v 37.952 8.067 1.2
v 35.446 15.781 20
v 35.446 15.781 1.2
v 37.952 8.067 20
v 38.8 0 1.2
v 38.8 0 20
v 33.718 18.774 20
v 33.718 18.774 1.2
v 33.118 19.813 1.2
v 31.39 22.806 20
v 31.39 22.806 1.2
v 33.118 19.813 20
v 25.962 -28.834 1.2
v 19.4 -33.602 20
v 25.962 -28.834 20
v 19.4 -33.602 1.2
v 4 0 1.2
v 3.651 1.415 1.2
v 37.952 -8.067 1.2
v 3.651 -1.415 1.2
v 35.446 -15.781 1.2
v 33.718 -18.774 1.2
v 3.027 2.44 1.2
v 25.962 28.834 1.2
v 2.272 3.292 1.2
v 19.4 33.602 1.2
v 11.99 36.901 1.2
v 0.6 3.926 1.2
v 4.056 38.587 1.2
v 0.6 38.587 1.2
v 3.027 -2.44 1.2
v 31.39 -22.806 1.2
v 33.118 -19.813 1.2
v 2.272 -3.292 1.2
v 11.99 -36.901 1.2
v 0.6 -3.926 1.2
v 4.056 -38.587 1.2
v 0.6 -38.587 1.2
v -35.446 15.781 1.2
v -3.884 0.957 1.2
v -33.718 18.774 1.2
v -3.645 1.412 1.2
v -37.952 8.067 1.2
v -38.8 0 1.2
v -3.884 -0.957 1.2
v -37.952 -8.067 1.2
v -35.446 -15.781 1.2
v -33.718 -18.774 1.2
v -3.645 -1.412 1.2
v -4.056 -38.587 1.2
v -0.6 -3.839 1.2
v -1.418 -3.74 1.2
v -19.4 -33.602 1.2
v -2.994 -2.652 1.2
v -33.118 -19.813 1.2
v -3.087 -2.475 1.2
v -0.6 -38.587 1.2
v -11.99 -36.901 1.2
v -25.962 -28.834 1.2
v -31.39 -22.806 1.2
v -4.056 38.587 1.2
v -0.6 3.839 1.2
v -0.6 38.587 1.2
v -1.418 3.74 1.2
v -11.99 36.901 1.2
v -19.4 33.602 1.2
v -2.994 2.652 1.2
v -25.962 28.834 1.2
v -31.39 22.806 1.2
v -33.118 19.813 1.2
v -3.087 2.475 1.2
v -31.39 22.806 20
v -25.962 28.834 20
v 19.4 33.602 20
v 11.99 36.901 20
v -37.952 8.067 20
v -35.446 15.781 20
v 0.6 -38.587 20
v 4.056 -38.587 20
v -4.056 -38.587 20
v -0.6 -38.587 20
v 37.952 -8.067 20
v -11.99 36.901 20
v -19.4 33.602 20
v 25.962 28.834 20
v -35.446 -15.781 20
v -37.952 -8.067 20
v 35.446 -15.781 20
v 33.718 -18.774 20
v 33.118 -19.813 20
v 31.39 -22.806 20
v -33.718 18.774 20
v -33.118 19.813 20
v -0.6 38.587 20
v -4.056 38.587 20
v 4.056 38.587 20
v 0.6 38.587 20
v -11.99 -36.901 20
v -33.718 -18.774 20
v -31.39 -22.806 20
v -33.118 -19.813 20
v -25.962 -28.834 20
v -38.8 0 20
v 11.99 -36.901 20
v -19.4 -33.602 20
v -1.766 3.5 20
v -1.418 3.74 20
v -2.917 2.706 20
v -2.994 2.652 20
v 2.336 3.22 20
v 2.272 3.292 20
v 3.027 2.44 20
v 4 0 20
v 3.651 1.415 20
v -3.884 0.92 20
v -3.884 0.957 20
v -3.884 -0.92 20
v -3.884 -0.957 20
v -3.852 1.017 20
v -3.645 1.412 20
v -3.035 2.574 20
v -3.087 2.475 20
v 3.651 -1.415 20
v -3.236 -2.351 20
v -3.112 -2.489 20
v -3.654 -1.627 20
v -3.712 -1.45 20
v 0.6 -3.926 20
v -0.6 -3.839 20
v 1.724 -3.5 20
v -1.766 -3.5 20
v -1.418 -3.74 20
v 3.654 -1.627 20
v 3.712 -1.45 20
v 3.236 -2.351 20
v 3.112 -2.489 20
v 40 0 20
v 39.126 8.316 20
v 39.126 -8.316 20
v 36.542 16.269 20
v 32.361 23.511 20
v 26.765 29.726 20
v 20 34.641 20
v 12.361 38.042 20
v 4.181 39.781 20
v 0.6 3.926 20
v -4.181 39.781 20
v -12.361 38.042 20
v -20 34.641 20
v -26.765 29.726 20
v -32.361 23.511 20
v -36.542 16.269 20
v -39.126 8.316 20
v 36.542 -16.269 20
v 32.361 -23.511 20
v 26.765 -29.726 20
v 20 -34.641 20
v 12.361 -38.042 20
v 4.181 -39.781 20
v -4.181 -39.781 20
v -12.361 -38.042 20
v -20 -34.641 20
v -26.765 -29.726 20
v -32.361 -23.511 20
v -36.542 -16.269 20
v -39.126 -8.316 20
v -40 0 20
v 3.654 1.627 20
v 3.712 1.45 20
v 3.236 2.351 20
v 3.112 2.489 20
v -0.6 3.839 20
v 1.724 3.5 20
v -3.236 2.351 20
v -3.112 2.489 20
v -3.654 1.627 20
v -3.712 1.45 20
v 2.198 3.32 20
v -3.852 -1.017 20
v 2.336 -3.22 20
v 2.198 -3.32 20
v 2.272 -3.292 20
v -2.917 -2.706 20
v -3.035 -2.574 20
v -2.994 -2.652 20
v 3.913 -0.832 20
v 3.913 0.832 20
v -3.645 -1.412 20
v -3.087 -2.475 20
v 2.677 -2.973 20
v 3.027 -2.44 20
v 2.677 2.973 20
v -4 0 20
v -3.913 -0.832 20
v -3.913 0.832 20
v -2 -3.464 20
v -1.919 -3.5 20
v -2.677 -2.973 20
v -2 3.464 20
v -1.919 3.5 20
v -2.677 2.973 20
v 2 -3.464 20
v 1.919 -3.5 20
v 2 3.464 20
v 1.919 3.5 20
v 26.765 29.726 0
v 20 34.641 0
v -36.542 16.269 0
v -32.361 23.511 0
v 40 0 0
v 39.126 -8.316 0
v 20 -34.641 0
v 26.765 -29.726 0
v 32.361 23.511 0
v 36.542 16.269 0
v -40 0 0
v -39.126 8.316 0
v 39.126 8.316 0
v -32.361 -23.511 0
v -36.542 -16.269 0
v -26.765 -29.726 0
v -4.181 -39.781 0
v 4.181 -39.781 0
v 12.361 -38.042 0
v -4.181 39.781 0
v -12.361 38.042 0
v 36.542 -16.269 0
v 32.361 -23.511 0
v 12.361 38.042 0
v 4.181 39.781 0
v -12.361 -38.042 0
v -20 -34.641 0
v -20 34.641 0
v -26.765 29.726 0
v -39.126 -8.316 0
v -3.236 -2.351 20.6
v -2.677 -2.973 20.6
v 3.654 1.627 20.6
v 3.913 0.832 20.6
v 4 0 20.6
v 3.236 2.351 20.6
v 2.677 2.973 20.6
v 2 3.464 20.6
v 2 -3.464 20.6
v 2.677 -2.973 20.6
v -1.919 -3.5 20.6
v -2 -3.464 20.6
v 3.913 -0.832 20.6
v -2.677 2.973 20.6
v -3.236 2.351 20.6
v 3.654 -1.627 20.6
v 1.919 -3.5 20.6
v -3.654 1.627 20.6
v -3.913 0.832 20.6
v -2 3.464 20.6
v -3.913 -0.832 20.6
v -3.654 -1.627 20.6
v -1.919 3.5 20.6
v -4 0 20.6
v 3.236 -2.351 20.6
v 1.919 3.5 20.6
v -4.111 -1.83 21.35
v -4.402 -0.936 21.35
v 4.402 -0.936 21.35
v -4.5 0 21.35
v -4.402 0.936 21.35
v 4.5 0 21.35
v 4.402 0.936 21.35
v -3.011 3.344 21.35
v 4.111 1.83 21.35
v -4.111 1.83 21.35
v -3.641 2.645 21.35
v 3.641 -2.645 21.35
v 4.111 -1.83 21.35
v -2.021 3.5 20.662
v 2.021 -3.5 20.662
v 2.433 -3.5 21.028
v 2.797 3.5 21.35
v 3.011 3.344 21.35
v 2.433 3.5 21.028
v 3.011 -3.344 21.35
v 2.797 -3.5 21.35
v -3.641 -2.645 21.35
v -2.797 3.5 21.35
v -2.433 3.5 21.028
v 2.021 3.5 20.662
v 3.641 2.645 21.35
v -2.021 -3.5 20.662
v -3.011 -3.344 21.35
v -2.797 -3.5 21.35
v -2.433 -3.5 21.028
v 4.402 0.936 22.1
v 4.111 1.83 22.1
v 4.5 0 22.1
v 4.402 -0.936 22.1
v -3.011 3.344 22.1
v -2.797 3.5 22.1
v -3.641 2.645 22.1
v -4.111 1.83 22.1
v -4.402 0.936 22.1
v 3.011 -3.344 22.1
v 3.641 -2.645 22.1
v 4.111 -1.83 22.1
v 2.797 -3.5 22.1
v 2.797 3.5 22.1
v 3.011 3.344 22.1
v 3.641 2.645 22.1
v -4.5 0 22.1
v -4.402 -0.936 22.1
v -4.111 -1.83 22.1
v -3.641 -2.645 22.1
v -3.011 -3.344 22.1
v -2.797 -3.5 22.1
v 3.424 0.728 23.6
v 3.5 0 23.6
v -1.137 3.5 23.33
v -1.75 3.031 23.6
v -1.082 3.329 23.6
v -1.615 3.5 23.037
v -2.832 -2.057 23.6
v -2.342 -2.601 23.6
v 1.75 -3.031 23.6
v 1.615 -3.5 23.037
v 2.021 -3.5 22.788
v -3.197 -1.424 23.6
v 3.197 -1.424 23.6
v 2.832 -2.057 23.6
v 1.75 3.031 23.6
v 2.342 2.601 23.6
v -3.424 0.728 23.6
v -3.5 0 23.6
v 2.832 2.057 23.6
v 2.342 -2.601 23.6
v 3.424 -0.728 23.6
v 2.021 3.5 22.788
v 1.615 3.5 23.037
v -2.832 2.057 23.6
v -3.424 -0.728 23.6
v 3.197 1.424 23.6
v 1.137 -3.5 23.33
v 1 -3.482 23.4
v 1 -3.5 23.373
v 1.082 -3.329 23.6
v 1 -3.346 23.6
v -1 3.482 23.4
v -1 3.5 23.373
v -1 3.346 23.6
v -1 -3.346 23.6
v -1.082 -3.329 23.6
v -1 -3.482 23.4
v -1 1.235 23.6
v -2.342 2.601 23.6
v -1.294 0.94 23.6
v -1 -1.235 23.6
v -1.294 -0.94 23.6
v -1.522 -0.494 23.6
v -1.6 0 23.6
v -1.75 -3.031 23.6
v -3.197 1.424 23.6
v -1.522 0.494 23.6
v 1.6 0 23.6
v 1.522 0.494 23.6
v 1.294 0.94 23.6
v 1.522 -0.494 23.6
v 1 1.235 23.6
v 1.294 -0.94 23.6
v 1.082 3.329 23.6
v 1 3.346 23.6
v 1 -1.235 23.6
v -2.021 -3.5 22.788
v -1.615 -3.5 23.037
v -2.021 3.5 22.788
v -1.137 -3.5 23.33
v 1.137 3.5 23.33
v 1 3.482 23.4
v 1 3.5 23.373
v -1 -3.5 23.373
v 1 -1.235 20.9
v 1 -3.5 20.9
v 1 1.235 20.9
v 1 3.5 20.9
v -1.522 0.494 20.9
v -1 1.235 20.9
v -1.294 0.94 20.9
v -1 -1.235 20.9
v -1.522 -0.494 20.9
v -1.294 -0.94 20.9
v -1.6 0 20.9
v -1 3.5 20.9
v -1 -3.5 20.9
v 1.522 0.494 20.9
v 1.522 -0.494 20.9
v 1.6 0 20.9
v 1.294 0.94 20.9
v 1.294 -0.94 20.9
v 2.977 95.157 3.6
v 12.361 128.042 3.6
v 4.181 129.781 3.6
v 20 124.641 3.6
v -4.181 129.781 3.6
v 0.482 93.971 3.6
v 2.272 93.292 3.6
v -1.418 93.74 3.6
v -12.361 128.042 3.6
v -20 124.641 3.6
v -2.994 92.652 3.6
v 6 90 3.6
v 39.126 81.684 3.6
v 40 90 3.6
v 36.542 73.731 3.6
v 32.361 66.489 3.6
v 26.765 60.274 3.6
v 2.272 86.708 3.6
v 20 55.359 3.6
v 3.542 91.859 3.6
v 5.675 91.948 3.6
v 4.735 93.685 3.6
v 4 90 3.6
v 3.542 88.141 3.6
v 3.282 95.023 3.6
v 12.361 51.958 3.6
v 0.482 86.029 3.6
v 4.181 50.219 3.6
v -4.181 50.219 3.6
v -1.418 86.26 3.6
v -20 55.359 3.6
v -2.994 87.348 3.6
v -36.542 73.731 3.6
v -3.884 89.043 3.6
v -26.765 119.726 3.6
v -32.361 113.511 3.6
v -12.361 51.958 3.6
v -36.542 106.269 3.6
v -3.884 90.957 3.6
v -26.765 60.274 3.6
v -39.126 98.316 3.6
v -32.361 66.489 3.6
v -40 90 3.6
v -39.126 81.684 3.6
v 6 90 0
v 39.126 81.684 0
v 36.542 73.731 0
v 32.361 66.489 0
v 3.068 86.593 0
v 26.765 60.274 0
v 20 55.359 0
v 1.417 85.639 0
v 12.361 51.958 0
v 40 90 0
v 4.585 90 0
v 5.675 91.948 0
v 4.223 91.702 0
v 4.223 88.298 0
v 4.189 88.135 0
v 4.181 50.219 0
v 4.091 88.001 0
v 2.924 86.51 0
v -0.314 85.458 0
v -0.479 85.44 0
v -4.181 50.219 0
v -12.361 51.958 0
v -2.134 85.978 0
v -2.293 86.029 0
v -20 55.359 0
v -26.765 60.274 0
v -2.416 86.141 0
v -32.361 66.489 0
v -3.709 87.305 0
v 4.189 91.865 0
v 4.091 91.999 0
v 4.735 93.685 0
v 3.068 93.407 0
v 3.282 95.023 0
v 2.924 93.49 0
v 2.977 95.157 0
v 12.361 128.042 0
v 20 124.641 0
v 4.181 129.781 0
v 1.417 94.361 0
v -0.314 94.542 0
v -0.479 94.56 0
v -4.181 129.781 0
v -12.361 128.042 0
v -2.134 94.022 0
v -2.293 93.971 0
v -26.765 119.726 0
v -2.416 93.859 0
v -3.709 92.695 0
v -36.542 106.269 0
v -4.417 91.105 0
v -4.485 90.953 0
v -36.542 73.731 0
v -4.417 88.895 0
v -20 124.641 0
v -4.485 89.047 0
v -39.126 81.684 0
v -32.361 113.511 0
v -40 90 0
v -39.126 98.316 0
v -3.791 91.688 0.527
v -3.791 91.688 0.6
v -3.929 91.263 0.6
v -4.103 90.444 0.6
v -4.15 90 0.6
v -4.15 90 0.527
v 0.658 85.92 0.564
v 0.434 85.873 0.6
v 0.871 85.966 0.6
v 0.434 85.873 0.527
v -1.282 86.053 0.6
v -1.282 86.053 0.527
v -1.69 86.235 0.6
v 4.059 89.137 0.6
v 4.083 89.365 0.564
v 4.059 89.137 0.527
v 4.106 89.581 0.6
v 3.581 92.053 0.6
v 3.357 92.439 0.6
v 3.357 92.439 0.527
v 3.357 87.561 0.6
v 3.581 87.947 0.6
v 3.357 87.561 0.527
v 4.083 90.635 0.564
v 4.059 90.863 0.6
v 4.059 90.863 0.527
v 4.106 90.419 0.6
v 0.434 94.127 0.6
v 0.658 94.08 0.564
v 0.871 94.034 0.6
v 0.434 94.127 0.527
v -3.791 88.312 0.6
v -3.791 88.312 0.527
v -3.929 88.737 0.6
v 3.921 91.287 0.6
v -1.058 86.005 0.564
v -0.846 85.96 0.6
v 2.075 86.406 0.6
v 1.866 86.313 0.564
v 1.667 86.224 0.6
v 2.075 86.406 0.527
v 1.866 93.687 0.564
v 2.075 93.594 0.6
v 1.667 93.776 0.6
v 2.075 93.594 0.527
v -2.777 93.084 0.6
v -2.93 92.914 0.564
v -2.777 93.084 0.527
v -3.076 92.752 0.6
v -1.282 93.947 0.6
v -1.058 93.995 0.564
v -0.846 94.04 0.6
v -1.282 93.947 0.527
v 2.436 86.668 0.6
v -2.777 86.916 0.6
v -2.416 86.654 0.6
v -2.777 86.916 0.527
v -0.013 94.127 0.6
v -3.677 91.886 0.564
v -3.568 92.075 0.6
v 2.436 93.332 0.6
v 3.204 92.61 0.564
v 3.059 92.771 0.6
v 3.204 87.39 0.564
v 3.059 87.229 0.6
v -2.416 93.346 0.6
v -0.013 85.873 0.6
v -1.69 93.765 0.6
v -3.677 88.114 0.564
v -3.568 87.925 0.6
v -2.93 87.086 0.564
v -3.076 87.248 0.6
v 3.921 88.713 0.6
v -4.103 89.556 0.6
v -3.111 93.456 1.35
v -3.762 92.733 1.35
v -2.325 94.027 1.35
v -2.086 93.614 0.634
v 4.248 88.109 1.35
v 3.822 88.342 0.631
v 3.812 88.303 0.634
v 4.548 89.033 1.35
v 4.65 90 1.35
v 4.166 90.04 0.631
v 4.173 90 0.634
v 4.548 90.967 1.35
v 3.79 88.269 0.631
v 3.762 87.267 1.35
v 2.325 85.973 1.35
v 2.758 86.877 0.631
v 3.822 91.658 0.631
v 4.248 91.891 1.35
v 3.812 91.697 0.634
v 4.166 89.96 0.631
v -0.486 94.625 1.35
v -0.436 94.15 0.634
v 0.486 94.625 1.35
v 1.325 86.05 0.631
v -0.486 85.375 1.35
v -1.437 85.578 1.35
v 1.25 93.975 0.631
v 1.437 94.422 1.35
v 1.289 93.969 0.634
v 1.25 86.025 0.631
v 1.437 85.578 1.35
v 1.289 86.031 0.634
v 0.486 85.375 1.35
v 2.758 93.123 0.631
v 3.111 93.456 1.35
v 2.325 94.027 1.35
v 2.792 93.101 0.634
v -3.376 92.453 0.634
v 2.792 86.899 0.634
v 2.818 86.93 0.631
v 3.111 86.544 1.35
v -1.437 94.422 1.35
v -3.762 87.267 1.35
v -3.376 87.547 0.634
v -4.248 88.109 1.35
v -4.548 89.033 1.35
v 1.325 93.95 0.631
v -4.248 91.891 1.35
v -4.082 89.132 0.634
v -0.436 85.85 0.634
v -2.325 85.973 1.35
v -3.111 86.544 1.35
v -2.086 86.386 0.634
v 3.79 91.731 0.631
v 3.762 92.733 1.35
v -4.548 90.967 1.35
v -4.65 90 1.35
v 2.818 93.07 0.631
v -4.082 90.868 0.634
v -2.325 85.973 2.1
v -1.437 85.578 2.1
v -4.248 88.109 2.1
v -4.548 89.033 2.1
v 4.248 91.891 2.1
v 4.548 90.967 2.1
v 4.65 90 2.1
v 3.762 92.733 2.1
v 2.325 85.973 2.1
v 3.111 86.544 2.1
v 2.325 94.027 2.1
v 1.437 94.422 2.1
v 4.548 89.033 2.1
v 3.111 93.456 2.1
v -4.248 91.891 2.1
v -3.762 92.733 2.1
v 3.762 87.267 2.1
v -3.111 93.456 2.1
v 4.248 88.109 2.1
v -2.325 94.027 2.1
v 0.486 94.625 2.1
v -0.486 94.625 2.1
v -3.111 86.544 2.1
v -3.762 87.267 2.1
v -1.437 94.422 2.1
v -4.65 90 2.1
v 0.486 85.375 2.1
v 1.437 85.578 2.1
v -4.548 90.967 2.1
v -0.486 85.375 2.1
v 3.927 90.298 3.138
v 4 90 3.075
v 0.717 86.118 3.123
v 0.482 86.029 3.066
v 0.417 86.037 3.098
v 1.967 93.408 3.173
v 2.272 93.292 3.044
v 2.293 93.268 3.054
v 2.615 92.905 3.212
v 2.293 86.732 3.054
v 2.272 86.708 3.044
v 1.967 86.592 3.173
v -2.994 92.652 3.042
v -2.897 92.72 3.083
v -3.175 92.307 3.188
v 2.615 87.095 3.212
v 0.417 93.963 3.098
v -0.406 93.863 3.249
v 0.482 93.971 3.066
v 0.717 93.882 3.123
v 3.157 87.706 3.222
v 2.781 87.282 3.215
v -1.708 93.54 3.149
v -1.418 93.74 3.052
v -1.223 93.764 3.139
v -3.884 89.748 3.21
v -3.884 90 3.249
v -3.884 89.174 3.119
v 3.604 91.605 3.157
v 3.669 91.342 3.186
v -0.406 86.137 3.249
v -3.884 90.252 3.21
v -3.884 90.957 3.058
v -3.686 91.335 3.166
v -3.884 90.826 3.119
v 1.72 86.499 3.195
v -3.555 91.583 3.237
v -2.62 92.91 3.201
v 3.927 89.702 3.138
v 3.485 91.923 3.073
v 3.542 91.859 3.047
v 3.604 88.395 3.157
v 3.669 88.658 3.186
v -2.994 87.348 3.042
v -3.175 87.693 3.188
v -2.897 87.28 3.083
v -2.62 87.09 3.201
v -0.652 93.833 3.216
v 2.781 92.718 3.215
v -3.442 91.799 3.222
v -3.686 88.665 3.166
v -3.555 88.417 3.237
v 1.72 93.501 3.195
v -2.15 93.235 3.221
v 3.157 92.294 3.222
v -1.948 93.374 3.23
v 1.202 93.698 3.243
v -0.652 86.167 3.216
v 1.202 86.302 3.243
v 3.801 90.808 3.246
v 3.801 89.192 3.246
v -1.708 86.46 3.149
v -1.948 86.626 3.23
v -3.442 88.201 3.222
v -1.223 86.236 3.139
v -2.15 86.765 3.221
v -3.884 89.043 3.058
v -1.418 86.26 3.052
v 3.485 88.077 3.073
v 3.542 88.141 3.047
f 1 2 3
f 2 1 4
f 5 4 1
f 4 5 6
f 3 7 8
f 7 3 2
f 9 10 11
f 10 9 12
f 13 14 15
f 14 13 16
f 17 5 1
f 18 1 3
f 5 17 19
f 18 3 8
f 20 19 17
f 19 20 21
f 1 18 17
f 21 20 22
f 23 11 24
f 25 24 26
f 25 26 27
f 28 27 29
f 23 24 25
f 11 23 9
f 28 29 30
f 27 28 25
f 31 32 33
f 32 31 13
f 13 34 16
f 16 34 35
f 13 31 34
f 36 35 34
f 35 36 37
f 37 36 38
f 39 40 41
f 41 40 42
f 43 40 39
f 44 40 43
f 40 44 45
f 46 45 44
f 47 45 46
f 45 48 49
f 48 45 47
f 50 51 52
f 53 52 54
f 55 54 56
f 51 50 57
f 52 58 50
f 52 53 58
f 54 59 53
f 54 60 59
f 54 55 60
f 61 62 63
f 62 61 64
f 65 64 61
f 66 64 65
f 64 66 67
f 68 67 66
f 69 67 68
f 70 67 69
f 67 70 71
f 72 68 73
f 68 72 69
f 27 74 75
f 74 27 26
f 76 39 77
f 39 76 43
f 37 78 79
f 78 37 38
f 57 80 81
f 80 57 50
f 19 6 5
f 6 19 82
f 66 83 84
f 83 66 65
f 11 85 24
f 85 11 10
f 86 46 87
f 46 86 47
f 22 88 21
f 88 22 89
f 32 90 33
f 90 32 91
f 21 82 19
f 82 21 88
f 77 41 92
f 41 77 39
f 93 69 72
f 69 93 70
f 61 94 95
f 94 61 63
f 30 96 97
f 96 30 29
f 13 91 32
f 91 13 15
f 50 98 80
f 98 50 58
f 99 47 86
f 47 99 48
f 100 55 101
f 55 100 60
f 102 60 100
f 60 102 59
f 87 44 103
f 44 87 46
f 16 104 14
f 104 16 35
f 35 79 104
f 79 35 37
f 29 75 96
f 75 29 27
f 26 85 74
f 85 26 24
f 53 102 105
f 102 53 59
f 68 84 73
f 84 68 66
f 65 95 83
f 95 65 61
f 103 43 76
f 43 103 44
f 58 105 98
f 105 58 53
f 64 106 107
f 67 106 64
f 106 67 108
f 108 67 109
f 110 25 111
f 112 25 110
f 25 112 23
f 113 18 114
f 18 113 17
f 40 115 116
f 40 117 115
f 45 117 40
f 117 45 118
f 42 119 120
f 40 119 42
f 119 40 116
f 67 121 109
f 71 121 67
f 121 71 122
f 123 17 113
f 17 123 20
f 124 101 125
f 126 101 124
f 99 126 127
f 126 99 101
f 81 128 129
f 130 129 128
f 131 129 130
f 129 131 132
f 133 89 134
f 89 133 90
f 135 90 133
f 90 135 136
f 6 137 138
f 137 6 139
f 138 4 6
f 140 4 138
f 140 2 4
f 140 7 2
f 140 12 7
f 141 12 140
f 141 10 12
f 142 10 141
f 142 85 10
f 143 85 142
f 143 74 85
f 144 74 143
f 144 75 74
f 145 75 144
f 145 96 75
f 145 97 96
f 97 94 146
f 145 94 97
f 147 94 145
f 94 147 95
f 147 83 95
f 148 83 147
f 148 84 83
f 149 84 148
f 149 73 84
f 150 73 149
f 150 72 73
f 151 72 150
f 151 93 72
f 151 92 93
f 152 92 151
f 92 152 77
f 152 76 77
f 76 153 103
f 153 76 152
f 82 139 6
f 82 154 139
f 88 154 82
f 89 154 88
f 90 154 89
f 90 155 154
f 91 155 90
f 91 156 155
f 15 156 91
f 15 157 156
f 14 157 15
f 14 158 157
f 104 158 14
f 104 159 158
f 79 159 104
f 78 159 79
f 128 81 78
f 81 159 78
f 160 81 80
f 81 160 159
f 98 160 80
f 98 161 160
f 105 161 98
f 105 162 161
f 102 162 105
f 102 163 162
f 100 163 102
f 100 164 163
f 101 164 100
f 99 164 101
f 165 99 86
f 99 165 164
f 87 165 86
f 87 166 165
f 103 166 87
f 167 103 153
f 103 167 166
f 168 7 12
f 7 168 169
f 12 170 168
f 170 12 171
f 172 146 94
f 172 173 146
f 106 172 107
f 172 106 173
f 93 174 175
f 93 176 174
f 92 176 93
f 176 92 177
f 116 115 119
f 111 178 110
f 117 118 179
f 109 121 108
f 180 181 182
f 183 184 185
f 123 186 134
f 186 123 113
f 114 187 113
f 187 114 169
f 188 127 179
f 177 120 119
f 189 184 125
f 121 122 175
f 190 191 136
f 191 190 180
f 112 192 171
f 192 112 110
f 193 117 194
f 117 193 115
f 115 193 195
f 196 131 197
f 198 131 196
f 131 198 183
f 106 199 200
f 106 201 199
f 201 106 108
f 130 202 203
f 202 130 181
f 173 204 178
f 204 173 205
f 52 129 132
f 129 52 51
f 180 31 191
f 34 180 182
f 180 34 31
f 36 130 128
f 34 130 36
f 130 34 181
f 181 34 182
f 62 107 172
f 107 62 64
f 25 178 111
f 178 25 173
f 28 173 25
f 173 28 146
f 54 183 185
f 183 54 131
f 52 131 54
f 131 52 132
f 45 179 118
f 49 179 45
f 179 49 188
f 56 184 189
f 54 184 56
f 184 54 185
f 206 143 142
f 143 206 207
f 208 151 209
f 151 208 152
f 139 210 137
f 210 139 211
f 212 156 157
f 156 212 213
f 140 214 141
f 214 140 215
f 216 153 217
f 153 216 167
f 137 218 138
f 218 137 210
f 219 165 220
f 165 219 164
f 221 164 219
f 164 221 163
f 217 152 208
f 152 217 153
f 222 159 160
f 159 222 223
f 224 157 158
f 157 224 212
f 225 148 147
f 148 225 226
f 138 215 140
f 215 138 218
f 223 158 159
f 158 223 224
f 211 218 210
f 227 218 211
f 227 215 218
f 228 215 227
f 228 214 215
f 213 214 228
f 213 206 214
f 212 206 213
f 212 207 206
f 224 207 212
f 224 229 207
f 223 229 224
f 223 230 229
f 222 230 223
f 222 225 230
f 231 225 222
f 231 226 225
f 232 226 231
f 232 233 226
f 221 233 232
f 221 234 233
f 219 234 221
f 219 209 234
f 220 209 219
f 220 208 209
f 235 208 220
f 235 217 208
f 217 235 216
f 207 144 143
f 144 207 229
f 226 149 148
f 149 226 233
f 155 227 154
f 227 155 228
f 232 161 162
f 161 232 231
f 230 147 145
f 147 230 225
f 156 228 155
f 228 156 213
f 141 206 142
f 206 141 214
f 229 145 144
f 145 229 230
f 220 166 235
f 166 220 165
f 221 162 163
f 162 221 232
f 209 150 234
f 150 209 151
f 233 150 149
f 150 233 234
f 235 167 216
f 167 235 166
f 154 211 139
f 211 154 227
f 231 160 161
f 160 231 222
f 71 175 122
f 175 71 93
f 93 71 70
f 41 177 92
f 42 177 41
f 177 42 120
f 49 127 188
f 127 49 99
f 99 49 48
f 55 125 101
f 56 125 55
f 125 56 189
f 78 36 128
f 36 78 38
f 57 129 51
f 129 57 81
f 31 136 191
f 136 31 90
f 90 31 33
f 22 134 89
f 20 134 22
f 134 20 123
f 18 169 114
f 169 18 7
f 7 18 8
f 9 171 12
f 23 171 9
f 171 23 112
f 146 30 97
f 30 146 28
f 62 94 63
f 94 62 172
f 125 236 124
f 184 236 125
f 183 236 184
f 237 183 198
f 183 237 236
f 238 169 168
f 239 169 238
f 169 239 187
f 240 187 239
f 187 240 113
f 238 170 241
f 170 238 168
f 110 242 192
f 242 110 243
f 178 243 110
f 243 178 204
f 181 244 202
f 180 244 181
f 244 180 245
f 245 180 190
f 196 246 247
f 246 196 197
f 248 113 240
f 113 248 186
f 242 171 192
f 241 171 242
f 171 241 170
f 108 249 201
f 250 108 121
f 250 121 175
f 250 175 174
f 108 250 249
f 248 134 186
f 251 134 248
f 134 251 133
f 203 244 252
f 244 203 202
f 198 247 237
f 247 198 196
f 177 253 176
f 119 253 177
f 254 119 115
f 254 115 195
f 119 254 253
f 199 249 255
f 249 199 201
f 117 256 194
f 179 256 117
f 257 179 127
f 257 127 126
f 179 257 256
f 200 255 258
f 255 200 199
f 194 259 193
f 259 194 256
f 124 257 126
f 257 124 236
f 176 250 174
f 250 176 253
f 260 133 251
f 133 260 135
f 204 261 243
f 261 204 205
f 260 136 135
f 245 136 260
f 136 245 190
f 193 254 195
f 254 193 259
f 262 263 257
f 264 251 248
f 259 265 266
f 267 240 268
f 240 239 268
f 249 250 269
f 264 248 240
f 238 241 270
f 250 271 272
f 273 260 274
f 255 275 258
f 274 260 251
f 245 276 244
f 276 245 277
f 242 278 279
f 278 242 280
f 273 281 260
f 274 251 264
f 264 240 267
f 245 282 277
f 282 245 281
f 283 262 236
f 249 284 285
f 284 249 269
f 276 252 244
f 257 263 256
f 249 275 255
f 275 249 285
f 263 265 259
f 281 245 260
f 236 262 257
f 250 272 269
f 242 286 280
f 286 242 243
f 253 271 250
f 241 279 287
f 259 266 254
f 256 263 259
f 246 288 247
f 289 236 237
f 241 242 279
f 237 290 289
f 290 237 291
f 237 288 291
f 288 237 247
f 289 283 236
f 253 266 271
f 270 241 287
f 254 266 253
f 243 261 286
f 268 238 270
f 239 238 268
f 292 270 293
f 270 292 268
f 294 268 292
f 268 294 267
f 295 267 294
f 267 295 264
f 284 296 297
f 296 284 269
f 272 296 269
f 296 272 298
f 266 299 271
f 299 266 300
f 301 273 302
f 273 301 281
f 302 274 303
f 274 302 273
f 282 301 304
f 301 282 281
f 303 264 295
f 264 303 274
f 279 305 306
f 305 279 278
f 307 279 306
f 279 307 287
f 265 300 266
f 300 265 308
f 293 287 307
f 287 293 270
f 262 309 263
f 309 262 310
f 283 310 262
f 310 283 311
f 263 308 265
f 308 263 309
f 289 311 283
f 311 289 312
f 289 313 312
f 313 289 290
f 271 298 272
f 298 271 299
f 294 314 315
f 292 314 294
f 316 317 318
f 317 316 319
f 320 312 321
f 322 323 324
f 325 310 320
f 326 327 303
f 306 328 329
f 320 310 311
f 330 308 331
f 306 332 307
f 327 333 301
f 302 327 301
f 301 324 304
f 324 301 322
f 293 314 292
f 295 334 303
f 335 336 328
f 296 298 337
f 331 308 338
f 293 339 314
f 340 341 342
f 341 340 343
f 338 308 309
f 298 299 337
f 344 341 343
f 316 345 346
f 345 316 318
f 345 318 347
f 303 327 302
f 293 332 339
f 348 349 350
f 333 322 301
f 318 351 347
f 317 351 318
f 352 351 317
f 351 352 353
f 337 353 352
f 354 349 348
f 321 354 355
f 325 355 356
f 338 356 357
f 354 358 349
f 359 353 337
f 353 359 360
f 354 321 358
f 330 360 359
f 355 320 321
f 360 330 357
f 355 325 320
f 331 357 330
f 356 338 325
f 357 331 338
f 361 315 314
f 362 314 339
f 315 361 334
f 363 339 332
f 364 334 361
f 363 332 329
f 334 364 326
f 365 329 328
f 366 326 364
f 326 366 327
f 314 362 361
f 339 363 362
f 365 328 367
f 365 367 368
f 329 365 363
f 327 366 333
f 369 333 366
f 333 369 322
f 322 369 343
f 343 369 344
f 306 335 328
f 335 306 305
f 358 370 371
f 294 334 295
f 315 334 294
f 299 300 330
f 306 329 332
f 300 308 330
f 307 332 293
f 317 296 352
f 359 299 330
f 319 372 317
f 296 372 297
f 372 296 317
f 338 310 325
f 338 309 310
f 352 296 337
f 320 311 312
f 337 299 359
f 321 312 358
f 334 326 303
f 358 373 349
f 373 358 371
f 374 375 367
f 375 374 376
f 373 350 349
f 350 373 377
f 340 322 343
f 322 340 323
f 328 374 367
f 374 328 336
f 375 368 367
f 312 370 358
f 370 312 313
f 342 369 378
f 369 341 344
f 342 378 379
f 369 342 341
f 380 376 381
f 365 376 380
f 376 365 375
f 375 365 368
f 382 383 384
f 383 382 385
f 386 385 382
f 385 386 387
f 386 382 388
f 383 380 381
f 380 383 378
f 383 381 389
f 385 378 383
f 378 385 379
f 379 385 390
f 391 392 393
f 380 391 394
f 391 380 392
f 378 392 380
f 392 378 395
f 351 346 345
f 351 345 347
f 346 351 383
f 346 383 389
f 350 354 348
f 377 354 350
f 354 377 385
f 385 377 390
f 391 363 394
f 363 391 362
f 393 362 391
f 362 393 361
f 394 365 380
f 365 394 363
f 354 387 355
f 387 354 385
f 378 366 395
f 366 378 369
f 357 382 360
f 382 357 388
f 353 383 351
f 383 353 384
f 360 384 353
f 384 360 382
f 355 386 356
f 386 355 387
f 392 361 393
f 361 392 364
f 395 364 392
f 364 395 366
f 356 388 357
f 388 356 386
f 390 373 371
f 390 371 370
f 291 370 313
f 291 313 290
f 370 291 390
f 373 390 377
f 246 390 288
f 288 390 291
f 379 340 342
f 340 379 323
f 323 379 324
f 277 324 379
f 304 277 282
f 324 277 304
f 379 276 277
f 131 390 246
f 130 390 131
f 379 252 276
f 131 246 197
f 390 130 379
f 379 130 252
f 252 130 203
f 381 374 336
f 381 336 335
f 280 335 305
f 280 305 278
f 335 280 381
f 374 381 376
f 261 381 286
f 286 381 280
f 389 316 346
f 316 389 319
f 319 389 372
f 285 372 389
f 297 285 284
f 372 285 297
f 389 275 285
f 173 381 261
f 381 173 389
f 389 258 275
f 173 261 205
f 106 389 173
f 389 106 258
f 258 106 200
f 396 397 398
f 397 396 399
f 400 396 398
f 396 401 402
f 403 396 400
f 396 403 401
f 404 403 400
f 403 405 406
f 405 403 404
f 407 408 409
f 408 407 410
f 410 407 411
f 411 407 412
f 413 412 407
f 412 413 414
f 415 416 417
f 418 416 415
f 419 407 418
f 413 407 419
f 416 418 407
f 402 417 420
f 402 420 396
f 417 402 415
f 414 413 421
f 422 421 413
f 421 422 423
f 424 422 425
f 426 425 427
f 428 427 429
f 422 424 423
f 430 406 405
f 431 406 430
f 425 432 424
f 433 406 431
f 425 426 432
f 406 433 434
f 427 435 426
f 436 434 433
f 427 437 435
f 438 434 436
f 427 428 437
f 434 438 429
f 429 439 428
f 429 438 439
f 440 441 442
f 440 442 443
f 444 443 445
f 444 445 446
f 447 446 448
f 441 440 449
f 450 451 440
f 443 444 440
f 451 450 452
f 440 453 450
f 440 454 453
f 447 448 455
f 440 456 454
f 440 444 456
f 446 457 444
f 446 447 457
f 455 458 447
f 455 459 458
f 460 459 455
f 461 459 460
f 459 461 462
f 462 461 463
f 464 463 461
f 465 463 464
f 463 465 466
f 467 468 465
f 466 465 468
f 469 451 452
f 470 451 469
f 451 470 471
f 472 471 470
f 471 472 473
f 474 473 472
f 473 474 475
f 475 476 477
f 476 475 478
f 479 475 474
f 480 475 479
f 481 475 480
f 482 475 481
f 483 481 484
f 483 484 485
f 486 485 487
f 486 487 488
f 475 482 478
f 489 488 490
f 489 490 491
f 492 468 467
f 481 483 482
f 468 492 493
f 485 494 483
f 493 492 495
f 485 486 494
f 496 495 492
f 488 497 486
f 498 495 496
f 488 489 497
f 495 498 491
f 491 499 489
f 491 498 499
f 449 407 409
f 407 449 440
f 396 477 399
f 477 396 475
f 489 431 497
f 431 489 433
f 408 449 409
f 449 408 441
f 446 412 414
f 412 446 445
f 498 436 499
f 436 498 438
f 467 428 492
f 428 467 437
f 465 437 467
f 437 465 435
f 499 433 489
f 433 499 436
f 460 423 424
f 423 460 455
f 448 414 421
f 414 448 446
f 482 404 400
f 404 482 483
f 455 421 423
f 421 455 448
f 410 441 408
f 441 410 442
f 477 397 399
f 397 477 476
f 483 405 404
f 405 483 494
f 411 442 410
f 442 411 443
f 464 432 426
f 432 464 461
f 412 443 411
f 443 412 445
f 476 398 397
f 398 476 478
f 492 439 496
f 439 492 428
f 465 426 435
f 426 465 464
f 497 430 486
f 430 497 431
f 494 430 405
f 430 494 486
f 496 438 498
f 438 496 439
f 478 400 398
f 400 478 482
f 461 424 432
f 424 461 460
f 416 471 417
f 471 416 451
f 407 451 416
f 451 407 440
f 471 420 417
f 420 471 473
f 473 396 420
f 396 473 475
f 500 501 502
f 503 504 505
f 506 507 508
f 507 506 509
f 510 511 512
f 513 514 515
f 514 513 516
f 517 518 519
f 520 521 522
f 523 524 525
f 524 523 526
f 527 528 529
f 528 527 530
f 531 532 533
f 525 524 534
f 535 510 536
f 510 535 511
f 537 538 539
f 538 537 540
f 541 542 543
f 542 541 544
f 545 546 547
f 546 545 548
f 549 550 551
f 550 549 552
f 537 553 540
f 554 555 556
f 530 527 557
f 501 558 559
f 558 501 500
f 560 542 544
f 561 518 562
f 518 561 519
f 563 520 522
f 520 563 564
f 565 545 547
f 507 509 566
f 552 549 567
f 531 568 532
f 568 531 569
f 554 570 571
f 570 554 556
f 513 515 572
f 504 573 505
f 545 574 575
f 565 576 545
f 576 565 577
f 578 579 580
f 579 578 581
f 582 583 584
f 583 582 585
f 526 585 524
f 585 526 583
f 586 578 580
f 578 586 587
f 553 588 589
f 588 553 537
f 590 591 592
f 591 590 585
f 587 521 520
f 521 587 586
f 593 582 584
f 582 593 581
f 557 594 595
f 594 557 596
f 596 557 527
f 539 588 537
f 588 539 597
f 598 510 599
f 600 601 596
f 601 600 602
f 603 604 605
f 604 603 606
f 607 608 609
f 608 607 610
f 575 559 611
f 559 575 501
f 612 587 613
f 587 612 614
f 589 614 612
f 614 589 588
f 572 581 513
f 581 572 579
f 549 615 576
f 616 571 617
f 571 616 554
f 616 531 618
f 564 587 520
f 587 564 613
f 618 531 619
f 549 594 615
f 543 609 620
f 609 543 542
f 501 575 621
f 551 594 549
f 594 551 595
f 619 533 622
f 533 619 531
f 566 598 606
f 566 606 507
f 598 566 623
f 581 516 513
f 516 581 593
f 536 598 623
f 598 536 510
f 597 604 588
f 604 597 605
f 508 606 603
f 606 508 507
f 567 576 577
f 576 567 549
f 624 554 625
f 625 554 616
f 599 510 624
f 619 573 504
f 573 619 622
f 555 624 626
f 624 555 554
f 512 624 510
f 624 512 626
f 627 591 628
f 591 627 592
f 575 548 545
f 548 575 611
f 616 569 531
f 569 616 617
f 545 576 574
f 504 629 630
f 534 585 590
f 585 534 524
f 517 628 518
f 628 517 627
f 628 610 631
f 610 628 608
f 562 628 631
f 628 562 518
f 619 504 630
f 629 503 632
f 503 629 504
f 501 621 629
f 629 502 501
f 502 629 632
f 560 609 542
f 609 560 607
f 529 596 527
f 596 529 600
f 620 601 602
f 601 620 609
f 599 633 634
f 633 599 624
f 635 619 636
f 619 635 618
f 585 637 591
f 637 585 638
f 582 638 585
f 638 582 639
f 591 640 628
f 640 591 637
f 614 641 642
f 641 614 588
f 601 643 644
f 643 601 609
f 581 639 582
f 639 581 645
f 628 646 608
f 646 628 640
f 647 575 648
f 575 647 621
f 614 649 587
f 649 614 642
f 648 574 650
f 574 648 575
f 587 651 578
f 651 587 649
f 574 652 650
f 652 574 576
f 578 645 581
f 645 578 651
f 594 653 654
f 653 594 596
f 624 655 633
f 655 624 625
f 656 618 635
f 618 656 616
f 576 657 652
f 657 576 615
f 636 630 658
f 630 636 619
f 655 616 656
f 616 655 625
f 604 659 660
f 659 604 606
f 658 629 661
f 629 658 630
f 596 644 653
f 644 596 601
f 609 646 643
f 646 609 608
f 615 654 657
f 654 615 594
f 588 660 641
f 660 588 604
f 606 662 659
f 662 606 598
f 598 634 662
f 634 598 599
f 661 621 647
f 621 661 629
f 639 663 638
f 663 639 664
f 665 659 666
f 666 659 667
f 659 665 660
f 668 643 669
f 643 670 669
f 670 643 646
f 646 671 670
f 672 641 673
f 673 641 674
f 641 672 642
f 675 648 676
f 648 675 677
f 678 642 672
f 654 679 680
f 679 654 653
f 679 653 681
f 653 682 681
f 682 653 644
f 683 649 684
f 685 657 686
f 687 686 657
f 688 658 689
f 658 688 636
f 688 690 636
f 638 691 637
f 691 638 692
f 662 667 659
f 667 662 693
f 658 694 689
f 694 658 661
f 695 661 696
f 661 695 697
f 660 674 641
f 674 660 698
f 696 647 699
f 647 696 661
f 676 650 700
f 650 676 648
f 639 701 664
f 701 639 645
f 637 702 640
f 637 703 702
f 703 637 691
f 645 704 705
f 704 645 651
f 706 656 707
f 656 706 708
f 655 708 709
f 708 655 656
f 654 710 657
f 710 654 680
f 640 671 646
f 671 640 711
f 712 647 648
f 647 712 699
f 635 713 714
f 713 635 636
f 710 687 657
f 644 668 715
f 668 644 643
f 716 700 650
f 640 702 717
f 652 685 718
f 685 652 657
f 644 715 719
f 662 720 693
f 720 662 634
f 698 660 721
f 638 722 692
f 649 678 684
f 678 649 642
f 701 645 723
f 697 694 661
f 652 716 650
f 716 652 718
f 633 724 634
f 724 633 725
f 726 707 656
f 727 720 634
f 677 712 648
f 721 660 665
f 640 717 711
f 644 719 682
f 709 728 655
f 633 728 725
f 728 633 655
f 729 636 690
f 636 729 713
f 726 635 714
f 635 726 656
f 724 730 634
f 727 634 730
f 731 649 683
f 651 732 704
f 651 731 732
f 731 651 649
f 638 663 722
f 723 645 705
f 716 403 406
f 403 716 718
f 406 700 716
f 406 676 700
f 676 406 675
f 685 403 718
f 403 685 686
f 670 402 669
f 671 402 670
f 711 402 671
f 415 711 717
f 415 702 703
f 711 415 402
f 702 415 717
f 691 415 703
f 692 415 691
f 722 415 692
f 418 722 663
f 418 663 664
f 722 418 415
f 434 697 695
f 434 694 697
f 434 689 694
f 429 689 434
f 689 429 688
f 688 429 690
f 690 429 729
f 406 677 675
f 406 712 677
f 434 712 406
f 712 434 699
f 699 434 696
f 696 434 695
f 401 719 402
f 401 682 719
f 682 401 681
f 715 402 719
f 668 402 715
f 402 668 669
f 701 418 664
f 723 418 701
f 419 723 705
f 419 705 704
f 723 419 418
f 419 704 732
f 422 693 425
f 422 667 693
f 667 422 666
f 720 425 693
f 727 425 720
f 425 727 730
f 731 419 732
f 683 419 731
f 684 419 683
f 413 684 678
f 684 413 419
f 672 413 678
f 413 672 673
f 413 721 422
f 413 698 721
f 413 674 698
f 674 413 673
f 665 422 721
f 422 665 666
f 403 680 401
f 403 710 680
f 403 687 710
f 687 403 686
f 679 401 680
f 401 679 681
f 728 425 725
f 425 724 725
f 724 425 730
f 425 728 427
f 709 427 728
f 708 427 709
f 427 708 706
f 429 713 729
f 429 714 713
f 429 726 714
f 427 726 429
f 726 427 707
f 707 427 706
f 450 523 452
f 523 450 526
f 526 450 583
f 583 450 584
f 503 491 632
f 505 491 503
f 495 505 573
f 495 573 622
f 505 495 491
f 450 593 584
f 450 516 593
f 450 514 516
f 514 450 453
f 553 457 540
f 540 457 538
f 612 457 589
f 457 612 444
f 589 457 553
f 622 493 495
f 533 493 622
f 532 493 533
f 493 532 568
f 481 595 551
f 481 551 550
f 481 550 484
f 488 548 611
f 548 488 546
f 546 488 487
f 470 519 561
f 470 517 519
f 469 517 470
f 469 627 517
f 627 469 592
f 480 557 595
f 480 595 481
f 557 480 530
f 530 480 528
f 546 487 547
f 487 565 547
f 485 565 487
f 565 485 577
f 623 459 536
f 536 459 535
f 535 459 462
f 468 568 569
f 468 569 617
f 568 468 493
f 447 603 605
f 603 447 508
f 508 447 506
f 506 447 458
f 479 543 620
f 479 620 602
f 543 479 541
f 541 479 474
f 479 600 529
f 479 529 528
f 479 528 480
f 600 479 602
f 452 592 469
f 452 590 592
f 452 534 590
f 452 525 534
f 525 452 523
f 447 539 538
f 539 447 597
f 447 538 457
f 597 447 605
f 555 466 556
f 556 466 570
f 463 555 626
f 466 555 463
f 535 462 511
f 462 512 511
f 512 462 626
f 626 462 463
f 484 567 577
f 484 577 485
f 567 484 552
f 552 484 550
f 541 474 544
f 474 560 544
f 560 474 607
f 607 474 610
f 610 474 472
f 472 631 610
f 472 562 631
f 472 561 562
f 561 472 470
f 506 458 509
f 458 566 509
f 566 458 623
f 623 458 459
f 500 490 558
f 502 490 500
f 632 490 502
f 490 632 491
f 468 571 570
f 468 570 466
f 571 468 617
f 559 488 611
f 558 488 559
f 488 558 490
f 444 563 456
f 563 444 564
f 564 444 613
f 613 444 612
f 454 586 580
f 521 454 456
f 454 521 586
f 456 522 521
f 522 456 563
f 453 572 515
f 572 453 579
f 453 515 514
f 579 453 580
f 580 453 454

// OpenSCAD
// [FL_INDEX: keywords="openscad, 3d_parametric, Customizable_Parametric_Round_Box, csg_solid" | COT="Parametric OpenSCAD design from 3DCodeverse"]
// Title: Customizable Parametric Round Box



//include <pins.scad>;

// Parametric round box by camperking v0.2
// http://www.thingiverse.com/thing:12134
// added option to screw the lid with a M3 screw
// improved thickness of the pin connectors
// usage is round_box(diameter, height, sections, wall_thickness, pin)
// diameter - is the diameter of your box
// height - defines the height of the box
// sections - how many sections you want
// wall_thickness - define your wallthickness, the pins height is 3 times the wallthickness
// pin - set to true if you want tbusers pin connector for the lid, set to false if you want to mount the lidwith a M3 screw
//
//usage for the lid is round_box_cover(diameter, sections, wall_thickness, pin)
// wall_thickness - this should be same value you have used at the box because the pinhole and pin height are calculated with this
//
//uncomment the following lines to test
//round_box(80, 20, 6, 1.2, true);
//round_box_cover(80, 6, 1.2, true);


/* [Global] */
part = "both"; // [first:Round Box only,second:Lid only,both:Box and lid]

Diameter = 80; // [10:250]
Height = 20; // [5:120]
Number_of_Sections = 6; // [0:32]
Pin_or_Hole = "Pin"; // [Pin, Hole]

/* [Hidden] */
diameter = Diameter;
height = Height;
sections = Number_of_Sections;
wall_thickness = 1.2;
pin = Pin_or_Hole;


if (part == "first") {
		round_box(diameter, height, sections, wall_thickness, pin);
	} else if (part == "second") {
		round_box_cover(diameter, sections, wall_thickness, pin);
	} else if (part == "both") {
      round_box(diameter, height, sections, wall_thickness, pin);
		translate([0, diameter+10, 0]) round_box_cover(diameter, sections, wall_thickness, pin);
	} else {
		both();
	}

module round_box(diameter, height, sections, wall_thickness, pin) {
	difference() {
		cylinder(h=height, r=diameter/2);
		if (pin == "Hole") {
			cylinder(h=height, r=1.25);
		}
		difference() {
			translate([0, 0, wall_thickness]) cylinder(h=height, r=diameter/2-wall_thickness);
			cylinder(h=height, r=4);
		}
		
	}
	for(i=[1:sections]) {
		rotate([0, 0, i * 360/sections]) translate([-wall_thickness/2, wall_thickness*2, 0]) cube([wall_thickness, diameter/2-wall_thickness*3, height]);
	}
	if (pin == "Pin") {
		translate([0, 0, height]) pin(h=wall_thickness*3);
	} 
}

module round_box_cover(diameter, sections, wall_thickness, pin) {
	difference() { union() {
		difference() {
			cylinder(h=wall_thickness*3, r=diameter/2);		
			difference() {
				cube([diameter, diameter, wall_thickness*3]);
				rotate([0, 0, 360/sections]) cube([diameter, diameter, wall_thickness*3]);
			}
		} 
			cylinder(h=wall_thickness*3, r=6);
		}
		if (pin == "Pin") {
			pinhole(h=wall_thickness*3);
		} else {
			cylinder(h=wall_thickness*3, r=1.5);
		}
	}
}





///////////////////////////////////////////////////////////////////////////
// Pin Connectors V2
// Tony Buser <tbuser@gmail.com>

// pinhole(h=5);

// test();
// pintack(h=10);
// pinpeg(h=20);

module test() {
  tolerance = 0.3;
  
  translate([-12, 12, 0]) pinpeg(h=20);
  translate([12, 12, 0]) pintack(h=10);
  
  difference() {
    union() {
      translate([0, -12, 2.5]) cube(size = [59, 20, 5], center = true);
      translate([24, -12, 7.5]) cube(size = [12, 20, 15], center = true);
    }
    translate([-24, -12, 0]) pinhole(h=5, t=tolerance);
    translate([-12, -12, 0]) pinhole(h=5, t=tolerance, tight=false);
    translate([0, -12, 0]) pinhole(h=10, t=tolerance);
    translate([12, -12, 0]) pinhole(h=10, t=tolerance, tight=false);
    translate([24, -12, 15]) rotate([0, 180, 0]) pinhole(h=10, t=tolerance);
  }
}

module pinhole(h=10, r=4, lh=3, lt=1, t=0.3, tight=true) {
  // h = shaft height
  // r = shaft radius
  // lh = lip height
  // lt = lip thickness
  // t = tolerance
  // tight = set to false if you want a joint that spins easily
  
  union() {
    pin_solid(h, r+(t/2), lh, lt);
    cylinder(h=h+0.2, r=r);
    // widen the cylinder slightly
    // cylinder(h=h+0.2, r=r+(t-0.2/2));
    if (tight == false) {
      cylinder(h=h+0.2, r=r+(t/2)+0.25);
    }
    // widen the entrance hole to make insertion easier
    translate([0, 0, -0.1]) cylinder(h=lh/3, r2=r, r1=r+(t/2)+(lt/2));
  }
}

module pin(h=10, r=4, lh=3, lt=1, side=false) {
  // h = shaft height
  // r = shaft radius
  // lh = lip height
  // lt = lip thickness
  // side = set to true if you want it printed horizontally

  if (side) {
    pin_horizontal(h, r, lh, lt);
  } else {
    pin_vertical(h, r, lh, lt);
  }
}

module pintack(h=10, r=4, lh=3, lt=1, bh=3, br=8.75) {
  // bh = base_height
  // br = base_radius
  
  union() {
    cylinder(h=bh, r=br);
    translate([0, 0, bh]) pin(h, r, lh, lt);
  }
}

module pinpeg(h=20, r=4, lh=3, lt=1) {
  union() {
    translate([0, -h/4+0.05, 0]) pin(h/2+0.1, r, lh, lt, side=true);
    translate([0, h/4-0.05, 0]) rotate([0, 0, 180]) pin(h/2+0.1, r, lh, lt, side=true);
  }
}

// just call pin instead, I made this module because it was easier to do the rotation option this way
// since openscad complains of recursion if I did it all in one module
module pin_vertical(h=10, r=4, lh=3, lt=1) {
  // h = shaft height
  // r = shaft radius
  // lh = lip height
  // lt = lip thickness

  difference() {
    pin_solid(h, r, lh, lt);
    
    // center cut
    translate([-r*0.5/2, -(r*2+lt*2)/2, h/4]) cube([r*0.5, r*2+lt*2, h]);
    translate([0, 0, h/4]) cylinder(h=h+lh, r=r/2.5, $fn=20);
    // center curve
    // translate([0, 0, h/4]) rotate([90, 0, 0]) cylinder(h=r*2, r=r*0.5/2, center=true, $fn=20);
  
    // side cuts
    translate([-r*2, -lt-r*1.125, -1]) cube([r*4, lt*2, h+2]);
    translate([-r*2, -lt+r*1.125, -1]) cube([r*4, lt*2, h+2]);
  }
}

// call pin with side=true instead of this
module pin_horizontal(h=10, r=4, lh=3, lt=1) {
  // h = shaft height
  // r = shaft radius
  // lh = lip height
  // lt = lip thickness
  translate([0, h/2, r*1.125-lt]) rotate([90, 0, 0]) pin_vertical(h, r, lh, lt);
}

// this is mainly to make the pinhole module easier
module pin_solid(h=10, r=4, lh=3, lt=1) {
  union() {
    // shaft
    cylinder(h=h-lh, r=r, $fn=30);
    // lip
    // translate([0, 0, h-lh]) cylinder(h=lh*0.25, r1=r, r2=r+(lt/2), $fn=30);
    // translate([0, 0, h-lh+lh*0.25]) cylinder(h=lh*0.25, r2=r, r1=r+(lt/2), $fn=30);
    // translate([0, 0, h-lh+lh*0.50]) cylinder(h=lh*0.50, r1=r, r2=r-(lt/2), $fn=30);

    // translate([0, 0, h-lh]) cylinder(h=lh*0.50, r1=r, r2=r+(lt/2), $fn=30);
    // translate([0, 0, h-lh+lh*0.50]) cylinder(h=lh*0.50, r1=r+(lt/2), r2=r-(lt/3), $fn=30);    

    translate([0, 0, h-lh]) cylinder(h=lh*0.25, r1=r, r2=r+(lt/2), $fn=30);
    translate([0, 0, h-lh+lh*0.25]) cylinder(h=lh*0.25, r=r+(lt/2), $fn=30);    
    translate([0, 0, h-lh+lh*0.50]) cylinder(h=lh*0.50, r1=r+(lt/2), r2=r-(lt/2), $fn=30);    

    // translate([0, 0, h-lh]) cylinder(h=lh, r1=r+(lt/2), r2=1, $fn=30);
    // translate([0, 0, h-lh-lt/2]) cylinder(h=lt/2, r1=r, r2=r+(lt/2), $fn=30);
  }
}
